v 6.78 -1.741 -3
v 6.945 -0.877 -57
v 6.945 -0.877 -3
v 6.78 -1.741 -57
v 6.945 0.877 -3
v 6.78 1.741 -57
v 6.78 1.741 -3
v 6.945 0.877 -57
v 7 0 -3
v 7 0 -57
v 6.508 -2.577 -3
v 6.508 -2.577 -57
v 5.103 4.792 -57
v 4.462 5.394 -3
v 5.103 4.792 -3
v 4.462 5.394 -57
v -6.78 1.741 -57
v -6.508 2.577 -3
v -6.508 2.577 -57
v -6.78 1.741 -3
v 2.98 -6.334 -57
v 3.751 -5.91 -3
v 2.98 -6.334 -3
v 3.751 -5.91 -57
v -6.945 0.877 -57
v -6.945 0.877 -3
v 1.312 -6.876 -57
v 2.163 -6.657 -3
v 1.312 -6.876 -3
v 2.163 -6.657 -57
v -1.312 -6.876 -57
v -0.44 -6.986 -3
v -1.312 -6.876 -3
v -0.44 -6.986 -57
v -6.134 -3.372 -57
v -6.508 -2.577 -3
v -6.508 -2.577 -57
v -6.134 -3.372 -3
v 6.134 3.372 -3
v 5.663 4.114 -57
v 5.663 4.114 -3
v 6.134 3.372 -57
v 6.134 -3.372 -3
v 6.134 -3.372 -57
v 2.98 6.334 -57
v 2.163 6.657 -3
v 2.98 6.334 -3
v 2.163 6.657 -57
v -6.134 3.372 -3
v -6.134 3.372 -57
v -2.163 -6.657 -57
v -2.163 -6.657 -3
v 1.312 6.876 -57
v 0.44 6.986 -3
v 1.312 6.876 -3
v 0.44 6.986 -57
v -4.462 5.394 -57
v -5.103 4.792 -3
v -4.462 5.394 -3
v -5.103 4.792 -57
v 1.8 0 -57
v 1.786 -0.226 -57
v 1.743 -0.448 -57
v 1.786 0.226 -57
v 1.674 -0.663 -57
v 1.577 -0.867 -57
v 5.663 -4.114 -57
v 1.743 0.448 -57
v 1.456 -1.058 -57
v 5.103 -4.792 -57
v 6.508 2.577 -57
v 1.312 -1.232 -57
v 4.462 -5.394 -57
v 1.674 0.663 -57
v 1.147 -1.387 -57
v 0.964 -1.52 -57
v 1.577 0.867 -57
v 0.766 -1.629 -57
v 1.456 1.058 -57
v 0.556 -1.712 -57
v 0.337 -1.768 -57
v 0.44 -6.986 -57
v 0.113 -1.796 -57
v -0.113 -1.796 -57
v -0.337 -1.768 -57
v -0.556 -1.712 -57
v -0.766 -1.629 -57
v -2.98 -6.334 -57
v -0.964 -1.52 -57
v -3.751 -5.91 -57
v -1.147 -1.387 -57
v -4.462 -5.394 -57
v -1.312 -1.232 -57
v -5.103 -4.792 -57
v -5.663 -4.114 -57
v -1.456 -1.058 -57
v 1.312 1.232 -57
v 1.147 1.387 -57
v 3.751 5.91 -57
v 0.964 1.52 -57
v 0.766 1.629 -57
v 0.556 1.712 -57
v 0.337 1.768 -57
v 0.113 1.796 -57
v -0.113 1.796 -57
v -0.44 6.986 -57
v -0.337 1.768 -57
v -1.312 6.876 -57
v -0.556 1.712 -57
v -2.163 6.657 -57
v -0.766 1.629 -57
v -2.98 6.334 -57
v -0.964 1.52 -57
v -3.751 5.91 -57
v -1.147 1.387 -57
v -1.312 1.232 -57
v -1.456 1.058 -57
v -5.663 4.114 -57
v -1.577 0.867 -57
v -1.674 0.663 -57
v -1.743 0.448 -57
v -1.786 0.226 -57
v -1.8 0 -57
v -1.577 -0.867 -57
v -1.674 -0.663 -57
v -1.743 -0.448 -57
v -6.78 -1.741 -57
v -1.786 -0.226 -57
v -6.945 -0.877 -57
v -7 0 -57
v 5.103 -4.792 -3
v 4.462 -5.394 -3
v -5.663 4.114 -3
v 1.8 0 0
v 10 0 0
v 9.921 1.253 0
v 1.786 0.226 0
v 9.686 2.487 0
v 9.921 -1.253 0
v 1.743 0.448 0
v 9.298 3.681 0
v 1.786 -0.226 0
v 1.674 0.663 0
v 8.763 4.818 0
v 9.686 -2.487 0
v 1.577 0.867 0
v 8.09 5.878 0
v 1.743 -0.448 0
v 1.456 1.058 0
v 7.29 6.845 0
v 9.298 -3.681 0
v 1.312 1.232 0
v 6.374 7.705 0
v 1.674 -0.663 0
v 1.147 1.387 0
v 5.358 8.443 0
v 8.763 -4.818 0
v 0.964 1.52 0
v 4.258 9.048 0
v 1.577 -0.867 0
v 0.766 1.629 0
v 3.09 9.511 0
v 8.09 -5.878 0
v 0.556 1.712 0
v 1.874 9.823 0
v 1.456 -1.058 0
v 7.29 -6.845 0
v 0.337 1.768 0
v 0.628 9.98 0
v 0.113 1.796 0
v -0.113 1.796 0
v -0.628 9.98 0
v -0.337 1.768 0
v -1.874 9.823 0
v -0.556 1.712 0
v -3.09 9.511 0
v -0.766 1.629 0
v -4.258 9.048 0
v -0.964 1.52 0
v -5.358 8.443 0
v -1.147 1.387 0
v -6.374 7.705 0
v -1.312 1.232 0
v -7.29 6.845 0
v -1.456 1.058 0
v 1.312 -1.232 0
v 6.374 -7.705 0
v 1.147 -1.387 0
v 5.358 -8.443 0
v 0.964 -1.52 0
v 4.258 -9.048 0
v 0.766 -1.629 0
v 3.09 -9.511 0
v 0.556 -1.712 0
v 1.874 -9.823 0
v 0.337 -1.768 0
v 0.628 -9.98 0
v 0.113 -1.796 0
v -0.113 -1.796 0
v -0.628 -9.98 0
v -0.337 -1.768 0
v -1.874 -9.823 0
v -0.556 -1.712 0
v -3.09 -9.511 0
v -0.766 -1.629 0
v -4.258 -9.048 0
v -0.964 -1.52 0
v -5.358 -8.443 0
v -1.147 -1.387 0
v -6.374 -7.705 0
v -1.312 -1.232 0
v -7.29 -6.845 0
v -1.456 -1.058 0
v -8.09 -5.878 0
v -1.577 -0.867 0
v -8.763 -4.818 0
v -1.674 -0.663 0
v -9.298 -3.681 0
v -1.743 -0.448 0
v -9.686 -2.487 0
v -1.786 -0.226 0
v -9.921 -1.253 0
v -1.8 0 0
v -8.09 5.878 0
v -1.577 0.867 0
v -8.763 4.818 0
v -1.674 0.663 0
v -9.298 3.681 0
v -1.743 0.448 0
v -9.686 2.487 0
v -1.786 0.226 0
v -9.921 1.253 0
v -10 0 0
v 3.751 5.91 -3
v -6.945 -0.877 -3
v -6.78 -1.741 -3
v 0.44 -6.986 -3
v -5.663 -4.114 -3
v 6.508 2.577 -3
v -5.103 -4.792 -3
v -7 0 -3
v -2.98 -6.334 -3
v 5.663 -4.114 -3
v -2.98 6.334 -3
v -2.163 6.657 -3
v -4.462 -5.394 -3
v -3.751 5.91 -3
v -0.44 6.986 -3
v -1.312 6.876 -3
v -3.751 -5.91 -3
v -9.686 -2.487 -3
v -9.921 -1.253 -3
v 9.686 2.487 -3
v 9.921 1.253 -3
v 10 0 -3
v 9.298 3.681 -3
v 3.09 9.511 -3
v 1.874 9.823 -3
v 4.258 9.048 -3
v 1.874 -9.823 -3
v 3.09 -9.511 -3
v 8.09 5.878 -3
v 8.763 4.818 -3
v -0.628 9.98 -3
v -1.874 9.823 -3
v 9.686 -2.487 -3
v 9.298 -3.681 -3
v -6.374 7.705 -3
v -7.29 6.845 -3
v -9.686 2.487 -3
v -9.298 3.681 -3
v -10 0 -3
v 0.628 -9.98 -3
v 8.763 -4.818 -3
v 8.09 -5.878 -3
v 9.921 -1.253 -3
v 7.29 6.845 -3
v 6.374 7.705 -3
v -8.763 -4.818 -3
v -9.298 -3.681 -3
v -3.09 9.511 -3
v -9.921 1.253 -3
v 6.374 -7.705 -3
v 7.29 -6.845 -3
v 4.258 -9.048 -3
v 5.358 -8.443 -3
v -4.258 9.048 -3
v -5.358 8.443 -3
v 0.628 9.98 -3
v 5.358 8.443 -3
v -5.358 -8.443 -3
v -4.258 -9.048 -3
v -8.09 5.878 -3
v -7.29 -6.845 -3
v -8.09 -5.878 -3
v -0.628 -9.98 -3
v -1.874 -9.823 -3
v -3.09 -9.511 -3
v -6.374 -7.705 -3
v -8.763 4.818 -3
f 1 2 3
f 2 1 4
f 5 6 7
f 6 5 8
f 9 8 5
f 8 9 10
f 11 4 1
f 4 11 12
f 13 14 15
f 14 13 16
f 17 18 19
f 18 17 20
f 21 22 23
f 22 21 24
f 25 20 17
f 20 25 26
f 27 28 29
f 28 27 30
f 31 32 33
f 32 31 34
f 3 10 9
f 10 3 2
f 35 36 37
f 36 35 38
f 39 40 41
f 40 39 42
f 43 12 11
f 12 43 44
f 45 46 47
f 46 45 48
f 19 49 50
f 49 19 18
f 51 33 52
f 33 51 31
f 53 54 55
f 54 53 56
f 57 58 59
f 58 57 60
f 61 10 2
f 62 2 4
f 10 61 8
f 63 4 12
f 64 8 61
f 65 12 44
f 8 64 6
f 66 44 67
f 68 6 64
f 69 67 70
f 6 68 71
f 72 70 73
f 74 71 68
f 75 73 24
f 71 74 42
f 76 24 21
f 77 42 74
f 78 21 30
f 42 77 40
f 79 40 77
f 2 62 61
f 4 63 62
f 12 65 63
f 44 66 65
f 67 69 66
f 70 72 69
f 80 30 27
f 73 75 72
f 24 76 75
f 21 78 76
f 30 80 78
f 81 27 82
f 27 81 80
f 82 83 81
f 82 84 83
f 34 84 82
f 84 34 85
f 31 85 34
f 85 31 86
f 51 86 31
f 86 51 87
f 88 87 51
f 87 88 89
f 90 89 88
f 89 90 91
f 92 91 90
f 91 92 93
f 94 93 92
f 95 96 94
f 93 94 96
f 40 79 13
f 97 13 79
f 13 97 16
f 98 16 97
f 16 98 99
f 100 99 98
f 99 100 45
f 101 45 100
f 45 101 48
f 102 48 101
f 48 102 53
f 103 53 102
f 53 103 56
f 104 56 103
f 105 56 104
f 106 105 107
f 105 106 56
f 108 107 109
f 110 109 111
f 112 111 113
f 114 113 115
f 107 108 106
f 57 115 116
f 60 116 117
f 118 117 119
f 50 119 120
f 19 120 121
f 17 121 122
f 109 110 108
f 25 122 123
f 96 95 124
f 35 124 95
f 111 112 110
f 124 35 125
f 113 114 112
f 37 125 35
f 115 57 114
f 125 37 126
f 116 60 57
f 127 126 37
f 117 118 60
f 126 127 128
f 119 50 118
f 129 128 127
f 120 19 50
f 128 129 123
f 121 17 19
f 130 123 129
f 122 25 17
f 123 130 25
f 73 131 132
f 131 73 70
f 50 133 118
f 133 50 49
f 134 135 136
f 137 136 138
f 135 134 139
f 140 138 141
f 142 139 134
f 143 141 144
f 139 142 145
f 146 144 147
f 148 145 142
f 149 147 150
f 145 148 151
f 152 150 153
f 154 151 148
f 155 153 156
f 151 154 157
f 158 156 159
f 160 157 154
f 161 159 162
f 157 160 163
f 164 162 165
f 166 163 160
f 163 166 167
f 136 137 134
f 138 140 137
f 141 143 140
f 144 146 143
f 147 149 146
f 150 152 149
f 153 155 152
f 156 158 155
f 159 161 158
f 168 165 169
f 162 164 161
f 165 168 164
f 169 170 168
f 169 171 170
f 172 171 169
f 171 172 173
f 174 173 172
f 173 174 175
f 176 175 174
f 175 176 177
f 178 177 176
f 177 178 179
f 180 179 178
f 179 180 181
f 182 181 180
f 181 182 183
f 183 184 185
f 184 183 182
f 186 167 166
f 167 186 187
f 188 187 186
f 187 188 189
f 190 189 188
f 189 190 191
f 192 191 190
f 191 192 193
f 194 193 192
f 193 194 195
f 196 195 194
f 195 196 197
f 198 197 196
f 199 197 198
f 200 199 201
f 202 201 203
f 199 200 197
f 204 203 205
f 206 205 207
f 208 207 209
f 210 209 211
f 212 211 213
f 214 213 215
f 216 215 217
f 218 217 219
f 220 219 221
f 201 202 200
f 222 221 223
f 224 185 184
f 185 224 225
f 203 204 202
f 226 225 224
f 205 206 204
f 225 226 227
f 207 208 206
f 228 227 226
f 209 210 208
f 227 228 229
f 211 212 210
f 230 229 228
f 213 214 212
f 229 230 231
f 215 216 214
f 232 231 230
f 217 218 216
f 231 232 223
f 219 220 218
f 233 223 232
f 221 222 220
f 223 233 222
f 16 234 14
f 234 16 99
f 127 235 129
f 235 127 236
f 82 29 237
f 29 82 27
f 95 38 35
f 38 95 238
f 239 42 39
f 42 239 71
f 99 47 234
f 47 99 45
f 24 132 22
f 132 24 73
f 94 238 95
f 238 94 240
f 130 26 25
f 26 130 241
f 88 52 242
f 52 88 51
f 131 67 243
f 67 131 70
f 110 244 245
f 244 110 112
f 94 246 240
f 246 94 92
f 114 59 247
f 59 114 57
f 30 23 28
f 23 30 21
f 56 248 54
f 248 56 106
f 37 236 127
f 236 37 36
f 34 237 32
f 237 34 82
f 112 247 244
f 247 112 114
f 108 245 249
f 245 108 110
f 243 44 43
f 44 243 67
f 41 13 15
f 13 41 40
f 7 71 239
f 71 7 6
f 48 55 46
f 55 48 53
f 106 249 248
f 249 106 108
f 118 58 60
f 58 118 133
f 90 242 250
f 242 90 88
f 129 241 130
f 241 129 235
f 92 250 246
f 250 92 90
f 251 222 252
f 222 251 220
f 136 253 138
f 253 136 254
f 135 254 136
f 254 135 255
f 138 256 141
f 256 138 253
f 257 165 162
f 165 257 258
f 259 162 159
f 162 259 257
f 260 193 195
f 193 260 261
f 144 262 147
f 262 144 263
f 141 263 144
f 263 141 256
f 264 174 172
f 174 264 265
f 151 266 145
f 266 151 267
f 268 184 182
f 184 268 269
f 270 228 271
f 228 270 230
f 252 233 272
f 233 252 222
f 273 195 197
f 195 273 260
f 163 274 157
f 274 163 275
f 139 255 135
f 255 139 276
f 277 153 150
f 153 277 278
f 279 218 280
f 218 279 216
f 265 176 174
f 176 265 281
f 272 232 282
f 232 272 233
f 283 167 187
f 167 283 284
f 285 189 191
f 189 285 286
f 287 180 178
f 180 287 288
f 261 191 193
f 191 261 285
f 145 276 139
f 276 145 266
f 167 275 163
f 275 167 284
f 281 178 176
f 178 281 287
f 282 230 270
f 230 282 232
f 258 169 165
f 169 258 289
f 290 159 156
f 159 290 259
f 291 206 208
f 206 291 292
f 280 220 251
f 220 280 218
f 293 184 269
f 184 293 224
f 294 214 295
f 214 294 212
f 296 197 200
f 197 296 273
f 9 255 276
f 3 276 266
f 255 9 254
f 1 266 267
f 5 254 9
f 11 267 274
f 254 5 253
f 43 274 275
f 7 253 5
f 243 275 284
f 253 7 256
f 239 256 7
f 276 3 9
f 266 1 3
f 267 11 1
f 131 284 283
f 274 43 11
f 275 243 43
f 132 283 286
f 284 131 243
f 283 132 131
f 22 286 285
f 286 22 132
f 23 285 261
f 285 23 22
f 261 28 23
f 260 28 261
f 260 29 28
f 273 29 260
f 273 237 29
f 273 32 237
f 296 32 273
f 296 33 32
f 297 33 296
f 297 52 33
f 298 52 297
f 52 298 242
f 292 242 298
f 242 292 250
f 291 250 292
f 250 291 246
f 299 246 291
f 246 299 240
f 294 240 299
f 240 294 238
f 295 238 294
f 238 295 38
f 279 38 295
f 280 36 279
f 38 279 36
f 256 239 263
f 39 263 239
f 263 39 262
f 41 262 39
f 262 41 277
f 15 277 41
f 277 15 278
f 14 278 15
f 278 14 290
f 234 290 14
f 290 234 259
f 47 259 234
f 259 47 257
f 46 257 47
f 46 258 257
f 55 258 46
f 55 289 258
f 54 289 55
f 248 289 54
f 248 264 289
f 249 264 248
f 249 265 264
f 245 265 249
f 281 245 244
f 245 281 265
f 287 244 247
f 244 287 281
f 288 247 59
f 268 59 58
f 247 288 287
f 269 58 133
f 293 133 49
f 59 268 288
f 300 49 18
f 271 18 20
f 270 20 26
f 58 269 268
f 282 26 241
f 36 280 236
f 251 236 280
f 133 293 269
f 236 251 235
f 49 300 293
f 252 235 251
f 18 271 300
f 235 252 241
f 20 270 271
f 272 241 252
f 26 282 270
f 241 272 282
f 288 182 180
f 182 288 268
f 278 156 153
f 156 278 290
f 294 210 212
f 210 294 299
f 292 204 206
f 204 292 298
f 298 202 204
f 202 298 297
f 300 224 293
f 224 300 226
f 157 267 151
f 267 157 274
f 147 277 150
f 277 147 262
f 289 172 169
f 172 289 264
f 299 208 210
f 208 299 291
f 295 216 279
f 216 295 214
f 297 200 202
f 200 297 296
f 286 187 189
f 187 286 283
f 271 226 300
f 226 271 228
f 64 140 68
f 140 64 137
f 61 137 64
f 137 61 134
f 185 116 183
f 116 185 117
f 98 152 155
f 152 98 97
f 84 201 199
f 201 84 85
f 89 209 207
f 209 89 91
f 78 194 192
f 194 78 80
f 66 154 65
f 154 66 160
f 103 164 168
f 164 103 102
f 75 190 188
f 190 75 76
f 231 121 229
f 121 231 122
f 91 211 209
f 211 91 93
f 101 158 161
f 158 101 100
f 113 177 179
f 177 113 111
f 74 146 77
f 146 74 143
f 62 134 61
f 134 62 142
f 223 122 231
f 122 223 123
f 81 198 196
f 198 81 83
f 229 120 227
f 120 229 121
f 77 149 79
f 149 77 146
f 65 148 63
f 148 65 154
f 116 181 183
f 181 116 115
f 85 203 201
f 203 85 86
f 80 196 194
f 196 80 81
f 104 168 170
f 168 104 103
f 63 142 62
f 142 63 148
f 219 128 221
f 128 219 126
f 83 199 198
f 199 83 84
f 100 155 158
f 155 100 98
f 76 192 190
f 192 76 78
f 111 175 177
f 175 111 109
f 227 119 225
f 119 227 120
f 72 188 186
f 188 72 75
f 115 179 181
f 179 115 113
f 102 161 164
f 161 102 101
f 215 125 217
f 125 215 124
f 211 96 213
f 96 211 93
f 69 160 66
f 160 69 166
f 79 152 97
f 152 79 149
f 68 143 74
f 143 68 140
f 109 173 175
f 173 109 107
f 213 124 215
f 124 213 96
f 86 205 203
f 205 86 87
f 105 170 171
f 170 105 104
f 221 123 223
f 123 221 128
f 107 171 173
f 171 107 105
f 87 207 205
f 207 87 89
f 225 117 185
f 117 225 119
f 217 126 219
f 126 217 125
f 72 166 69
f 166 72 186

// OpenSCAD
$fn = 50;


difference() {
	union() {
		translate(v = [0, 0, -57.0000000000]) {
			cylinder(h = 57, r = 7.0000000000);
		}
		translate(v = [0, 0, -3.0000000000]) {
			cylinder(h = 3, r = 10.0000000000);
		}
	}
	union() {
		#translate(v = [0, 0, -57]) {
			cylinder(h = 57, r = 1.8000000000);
		}
	}
}
